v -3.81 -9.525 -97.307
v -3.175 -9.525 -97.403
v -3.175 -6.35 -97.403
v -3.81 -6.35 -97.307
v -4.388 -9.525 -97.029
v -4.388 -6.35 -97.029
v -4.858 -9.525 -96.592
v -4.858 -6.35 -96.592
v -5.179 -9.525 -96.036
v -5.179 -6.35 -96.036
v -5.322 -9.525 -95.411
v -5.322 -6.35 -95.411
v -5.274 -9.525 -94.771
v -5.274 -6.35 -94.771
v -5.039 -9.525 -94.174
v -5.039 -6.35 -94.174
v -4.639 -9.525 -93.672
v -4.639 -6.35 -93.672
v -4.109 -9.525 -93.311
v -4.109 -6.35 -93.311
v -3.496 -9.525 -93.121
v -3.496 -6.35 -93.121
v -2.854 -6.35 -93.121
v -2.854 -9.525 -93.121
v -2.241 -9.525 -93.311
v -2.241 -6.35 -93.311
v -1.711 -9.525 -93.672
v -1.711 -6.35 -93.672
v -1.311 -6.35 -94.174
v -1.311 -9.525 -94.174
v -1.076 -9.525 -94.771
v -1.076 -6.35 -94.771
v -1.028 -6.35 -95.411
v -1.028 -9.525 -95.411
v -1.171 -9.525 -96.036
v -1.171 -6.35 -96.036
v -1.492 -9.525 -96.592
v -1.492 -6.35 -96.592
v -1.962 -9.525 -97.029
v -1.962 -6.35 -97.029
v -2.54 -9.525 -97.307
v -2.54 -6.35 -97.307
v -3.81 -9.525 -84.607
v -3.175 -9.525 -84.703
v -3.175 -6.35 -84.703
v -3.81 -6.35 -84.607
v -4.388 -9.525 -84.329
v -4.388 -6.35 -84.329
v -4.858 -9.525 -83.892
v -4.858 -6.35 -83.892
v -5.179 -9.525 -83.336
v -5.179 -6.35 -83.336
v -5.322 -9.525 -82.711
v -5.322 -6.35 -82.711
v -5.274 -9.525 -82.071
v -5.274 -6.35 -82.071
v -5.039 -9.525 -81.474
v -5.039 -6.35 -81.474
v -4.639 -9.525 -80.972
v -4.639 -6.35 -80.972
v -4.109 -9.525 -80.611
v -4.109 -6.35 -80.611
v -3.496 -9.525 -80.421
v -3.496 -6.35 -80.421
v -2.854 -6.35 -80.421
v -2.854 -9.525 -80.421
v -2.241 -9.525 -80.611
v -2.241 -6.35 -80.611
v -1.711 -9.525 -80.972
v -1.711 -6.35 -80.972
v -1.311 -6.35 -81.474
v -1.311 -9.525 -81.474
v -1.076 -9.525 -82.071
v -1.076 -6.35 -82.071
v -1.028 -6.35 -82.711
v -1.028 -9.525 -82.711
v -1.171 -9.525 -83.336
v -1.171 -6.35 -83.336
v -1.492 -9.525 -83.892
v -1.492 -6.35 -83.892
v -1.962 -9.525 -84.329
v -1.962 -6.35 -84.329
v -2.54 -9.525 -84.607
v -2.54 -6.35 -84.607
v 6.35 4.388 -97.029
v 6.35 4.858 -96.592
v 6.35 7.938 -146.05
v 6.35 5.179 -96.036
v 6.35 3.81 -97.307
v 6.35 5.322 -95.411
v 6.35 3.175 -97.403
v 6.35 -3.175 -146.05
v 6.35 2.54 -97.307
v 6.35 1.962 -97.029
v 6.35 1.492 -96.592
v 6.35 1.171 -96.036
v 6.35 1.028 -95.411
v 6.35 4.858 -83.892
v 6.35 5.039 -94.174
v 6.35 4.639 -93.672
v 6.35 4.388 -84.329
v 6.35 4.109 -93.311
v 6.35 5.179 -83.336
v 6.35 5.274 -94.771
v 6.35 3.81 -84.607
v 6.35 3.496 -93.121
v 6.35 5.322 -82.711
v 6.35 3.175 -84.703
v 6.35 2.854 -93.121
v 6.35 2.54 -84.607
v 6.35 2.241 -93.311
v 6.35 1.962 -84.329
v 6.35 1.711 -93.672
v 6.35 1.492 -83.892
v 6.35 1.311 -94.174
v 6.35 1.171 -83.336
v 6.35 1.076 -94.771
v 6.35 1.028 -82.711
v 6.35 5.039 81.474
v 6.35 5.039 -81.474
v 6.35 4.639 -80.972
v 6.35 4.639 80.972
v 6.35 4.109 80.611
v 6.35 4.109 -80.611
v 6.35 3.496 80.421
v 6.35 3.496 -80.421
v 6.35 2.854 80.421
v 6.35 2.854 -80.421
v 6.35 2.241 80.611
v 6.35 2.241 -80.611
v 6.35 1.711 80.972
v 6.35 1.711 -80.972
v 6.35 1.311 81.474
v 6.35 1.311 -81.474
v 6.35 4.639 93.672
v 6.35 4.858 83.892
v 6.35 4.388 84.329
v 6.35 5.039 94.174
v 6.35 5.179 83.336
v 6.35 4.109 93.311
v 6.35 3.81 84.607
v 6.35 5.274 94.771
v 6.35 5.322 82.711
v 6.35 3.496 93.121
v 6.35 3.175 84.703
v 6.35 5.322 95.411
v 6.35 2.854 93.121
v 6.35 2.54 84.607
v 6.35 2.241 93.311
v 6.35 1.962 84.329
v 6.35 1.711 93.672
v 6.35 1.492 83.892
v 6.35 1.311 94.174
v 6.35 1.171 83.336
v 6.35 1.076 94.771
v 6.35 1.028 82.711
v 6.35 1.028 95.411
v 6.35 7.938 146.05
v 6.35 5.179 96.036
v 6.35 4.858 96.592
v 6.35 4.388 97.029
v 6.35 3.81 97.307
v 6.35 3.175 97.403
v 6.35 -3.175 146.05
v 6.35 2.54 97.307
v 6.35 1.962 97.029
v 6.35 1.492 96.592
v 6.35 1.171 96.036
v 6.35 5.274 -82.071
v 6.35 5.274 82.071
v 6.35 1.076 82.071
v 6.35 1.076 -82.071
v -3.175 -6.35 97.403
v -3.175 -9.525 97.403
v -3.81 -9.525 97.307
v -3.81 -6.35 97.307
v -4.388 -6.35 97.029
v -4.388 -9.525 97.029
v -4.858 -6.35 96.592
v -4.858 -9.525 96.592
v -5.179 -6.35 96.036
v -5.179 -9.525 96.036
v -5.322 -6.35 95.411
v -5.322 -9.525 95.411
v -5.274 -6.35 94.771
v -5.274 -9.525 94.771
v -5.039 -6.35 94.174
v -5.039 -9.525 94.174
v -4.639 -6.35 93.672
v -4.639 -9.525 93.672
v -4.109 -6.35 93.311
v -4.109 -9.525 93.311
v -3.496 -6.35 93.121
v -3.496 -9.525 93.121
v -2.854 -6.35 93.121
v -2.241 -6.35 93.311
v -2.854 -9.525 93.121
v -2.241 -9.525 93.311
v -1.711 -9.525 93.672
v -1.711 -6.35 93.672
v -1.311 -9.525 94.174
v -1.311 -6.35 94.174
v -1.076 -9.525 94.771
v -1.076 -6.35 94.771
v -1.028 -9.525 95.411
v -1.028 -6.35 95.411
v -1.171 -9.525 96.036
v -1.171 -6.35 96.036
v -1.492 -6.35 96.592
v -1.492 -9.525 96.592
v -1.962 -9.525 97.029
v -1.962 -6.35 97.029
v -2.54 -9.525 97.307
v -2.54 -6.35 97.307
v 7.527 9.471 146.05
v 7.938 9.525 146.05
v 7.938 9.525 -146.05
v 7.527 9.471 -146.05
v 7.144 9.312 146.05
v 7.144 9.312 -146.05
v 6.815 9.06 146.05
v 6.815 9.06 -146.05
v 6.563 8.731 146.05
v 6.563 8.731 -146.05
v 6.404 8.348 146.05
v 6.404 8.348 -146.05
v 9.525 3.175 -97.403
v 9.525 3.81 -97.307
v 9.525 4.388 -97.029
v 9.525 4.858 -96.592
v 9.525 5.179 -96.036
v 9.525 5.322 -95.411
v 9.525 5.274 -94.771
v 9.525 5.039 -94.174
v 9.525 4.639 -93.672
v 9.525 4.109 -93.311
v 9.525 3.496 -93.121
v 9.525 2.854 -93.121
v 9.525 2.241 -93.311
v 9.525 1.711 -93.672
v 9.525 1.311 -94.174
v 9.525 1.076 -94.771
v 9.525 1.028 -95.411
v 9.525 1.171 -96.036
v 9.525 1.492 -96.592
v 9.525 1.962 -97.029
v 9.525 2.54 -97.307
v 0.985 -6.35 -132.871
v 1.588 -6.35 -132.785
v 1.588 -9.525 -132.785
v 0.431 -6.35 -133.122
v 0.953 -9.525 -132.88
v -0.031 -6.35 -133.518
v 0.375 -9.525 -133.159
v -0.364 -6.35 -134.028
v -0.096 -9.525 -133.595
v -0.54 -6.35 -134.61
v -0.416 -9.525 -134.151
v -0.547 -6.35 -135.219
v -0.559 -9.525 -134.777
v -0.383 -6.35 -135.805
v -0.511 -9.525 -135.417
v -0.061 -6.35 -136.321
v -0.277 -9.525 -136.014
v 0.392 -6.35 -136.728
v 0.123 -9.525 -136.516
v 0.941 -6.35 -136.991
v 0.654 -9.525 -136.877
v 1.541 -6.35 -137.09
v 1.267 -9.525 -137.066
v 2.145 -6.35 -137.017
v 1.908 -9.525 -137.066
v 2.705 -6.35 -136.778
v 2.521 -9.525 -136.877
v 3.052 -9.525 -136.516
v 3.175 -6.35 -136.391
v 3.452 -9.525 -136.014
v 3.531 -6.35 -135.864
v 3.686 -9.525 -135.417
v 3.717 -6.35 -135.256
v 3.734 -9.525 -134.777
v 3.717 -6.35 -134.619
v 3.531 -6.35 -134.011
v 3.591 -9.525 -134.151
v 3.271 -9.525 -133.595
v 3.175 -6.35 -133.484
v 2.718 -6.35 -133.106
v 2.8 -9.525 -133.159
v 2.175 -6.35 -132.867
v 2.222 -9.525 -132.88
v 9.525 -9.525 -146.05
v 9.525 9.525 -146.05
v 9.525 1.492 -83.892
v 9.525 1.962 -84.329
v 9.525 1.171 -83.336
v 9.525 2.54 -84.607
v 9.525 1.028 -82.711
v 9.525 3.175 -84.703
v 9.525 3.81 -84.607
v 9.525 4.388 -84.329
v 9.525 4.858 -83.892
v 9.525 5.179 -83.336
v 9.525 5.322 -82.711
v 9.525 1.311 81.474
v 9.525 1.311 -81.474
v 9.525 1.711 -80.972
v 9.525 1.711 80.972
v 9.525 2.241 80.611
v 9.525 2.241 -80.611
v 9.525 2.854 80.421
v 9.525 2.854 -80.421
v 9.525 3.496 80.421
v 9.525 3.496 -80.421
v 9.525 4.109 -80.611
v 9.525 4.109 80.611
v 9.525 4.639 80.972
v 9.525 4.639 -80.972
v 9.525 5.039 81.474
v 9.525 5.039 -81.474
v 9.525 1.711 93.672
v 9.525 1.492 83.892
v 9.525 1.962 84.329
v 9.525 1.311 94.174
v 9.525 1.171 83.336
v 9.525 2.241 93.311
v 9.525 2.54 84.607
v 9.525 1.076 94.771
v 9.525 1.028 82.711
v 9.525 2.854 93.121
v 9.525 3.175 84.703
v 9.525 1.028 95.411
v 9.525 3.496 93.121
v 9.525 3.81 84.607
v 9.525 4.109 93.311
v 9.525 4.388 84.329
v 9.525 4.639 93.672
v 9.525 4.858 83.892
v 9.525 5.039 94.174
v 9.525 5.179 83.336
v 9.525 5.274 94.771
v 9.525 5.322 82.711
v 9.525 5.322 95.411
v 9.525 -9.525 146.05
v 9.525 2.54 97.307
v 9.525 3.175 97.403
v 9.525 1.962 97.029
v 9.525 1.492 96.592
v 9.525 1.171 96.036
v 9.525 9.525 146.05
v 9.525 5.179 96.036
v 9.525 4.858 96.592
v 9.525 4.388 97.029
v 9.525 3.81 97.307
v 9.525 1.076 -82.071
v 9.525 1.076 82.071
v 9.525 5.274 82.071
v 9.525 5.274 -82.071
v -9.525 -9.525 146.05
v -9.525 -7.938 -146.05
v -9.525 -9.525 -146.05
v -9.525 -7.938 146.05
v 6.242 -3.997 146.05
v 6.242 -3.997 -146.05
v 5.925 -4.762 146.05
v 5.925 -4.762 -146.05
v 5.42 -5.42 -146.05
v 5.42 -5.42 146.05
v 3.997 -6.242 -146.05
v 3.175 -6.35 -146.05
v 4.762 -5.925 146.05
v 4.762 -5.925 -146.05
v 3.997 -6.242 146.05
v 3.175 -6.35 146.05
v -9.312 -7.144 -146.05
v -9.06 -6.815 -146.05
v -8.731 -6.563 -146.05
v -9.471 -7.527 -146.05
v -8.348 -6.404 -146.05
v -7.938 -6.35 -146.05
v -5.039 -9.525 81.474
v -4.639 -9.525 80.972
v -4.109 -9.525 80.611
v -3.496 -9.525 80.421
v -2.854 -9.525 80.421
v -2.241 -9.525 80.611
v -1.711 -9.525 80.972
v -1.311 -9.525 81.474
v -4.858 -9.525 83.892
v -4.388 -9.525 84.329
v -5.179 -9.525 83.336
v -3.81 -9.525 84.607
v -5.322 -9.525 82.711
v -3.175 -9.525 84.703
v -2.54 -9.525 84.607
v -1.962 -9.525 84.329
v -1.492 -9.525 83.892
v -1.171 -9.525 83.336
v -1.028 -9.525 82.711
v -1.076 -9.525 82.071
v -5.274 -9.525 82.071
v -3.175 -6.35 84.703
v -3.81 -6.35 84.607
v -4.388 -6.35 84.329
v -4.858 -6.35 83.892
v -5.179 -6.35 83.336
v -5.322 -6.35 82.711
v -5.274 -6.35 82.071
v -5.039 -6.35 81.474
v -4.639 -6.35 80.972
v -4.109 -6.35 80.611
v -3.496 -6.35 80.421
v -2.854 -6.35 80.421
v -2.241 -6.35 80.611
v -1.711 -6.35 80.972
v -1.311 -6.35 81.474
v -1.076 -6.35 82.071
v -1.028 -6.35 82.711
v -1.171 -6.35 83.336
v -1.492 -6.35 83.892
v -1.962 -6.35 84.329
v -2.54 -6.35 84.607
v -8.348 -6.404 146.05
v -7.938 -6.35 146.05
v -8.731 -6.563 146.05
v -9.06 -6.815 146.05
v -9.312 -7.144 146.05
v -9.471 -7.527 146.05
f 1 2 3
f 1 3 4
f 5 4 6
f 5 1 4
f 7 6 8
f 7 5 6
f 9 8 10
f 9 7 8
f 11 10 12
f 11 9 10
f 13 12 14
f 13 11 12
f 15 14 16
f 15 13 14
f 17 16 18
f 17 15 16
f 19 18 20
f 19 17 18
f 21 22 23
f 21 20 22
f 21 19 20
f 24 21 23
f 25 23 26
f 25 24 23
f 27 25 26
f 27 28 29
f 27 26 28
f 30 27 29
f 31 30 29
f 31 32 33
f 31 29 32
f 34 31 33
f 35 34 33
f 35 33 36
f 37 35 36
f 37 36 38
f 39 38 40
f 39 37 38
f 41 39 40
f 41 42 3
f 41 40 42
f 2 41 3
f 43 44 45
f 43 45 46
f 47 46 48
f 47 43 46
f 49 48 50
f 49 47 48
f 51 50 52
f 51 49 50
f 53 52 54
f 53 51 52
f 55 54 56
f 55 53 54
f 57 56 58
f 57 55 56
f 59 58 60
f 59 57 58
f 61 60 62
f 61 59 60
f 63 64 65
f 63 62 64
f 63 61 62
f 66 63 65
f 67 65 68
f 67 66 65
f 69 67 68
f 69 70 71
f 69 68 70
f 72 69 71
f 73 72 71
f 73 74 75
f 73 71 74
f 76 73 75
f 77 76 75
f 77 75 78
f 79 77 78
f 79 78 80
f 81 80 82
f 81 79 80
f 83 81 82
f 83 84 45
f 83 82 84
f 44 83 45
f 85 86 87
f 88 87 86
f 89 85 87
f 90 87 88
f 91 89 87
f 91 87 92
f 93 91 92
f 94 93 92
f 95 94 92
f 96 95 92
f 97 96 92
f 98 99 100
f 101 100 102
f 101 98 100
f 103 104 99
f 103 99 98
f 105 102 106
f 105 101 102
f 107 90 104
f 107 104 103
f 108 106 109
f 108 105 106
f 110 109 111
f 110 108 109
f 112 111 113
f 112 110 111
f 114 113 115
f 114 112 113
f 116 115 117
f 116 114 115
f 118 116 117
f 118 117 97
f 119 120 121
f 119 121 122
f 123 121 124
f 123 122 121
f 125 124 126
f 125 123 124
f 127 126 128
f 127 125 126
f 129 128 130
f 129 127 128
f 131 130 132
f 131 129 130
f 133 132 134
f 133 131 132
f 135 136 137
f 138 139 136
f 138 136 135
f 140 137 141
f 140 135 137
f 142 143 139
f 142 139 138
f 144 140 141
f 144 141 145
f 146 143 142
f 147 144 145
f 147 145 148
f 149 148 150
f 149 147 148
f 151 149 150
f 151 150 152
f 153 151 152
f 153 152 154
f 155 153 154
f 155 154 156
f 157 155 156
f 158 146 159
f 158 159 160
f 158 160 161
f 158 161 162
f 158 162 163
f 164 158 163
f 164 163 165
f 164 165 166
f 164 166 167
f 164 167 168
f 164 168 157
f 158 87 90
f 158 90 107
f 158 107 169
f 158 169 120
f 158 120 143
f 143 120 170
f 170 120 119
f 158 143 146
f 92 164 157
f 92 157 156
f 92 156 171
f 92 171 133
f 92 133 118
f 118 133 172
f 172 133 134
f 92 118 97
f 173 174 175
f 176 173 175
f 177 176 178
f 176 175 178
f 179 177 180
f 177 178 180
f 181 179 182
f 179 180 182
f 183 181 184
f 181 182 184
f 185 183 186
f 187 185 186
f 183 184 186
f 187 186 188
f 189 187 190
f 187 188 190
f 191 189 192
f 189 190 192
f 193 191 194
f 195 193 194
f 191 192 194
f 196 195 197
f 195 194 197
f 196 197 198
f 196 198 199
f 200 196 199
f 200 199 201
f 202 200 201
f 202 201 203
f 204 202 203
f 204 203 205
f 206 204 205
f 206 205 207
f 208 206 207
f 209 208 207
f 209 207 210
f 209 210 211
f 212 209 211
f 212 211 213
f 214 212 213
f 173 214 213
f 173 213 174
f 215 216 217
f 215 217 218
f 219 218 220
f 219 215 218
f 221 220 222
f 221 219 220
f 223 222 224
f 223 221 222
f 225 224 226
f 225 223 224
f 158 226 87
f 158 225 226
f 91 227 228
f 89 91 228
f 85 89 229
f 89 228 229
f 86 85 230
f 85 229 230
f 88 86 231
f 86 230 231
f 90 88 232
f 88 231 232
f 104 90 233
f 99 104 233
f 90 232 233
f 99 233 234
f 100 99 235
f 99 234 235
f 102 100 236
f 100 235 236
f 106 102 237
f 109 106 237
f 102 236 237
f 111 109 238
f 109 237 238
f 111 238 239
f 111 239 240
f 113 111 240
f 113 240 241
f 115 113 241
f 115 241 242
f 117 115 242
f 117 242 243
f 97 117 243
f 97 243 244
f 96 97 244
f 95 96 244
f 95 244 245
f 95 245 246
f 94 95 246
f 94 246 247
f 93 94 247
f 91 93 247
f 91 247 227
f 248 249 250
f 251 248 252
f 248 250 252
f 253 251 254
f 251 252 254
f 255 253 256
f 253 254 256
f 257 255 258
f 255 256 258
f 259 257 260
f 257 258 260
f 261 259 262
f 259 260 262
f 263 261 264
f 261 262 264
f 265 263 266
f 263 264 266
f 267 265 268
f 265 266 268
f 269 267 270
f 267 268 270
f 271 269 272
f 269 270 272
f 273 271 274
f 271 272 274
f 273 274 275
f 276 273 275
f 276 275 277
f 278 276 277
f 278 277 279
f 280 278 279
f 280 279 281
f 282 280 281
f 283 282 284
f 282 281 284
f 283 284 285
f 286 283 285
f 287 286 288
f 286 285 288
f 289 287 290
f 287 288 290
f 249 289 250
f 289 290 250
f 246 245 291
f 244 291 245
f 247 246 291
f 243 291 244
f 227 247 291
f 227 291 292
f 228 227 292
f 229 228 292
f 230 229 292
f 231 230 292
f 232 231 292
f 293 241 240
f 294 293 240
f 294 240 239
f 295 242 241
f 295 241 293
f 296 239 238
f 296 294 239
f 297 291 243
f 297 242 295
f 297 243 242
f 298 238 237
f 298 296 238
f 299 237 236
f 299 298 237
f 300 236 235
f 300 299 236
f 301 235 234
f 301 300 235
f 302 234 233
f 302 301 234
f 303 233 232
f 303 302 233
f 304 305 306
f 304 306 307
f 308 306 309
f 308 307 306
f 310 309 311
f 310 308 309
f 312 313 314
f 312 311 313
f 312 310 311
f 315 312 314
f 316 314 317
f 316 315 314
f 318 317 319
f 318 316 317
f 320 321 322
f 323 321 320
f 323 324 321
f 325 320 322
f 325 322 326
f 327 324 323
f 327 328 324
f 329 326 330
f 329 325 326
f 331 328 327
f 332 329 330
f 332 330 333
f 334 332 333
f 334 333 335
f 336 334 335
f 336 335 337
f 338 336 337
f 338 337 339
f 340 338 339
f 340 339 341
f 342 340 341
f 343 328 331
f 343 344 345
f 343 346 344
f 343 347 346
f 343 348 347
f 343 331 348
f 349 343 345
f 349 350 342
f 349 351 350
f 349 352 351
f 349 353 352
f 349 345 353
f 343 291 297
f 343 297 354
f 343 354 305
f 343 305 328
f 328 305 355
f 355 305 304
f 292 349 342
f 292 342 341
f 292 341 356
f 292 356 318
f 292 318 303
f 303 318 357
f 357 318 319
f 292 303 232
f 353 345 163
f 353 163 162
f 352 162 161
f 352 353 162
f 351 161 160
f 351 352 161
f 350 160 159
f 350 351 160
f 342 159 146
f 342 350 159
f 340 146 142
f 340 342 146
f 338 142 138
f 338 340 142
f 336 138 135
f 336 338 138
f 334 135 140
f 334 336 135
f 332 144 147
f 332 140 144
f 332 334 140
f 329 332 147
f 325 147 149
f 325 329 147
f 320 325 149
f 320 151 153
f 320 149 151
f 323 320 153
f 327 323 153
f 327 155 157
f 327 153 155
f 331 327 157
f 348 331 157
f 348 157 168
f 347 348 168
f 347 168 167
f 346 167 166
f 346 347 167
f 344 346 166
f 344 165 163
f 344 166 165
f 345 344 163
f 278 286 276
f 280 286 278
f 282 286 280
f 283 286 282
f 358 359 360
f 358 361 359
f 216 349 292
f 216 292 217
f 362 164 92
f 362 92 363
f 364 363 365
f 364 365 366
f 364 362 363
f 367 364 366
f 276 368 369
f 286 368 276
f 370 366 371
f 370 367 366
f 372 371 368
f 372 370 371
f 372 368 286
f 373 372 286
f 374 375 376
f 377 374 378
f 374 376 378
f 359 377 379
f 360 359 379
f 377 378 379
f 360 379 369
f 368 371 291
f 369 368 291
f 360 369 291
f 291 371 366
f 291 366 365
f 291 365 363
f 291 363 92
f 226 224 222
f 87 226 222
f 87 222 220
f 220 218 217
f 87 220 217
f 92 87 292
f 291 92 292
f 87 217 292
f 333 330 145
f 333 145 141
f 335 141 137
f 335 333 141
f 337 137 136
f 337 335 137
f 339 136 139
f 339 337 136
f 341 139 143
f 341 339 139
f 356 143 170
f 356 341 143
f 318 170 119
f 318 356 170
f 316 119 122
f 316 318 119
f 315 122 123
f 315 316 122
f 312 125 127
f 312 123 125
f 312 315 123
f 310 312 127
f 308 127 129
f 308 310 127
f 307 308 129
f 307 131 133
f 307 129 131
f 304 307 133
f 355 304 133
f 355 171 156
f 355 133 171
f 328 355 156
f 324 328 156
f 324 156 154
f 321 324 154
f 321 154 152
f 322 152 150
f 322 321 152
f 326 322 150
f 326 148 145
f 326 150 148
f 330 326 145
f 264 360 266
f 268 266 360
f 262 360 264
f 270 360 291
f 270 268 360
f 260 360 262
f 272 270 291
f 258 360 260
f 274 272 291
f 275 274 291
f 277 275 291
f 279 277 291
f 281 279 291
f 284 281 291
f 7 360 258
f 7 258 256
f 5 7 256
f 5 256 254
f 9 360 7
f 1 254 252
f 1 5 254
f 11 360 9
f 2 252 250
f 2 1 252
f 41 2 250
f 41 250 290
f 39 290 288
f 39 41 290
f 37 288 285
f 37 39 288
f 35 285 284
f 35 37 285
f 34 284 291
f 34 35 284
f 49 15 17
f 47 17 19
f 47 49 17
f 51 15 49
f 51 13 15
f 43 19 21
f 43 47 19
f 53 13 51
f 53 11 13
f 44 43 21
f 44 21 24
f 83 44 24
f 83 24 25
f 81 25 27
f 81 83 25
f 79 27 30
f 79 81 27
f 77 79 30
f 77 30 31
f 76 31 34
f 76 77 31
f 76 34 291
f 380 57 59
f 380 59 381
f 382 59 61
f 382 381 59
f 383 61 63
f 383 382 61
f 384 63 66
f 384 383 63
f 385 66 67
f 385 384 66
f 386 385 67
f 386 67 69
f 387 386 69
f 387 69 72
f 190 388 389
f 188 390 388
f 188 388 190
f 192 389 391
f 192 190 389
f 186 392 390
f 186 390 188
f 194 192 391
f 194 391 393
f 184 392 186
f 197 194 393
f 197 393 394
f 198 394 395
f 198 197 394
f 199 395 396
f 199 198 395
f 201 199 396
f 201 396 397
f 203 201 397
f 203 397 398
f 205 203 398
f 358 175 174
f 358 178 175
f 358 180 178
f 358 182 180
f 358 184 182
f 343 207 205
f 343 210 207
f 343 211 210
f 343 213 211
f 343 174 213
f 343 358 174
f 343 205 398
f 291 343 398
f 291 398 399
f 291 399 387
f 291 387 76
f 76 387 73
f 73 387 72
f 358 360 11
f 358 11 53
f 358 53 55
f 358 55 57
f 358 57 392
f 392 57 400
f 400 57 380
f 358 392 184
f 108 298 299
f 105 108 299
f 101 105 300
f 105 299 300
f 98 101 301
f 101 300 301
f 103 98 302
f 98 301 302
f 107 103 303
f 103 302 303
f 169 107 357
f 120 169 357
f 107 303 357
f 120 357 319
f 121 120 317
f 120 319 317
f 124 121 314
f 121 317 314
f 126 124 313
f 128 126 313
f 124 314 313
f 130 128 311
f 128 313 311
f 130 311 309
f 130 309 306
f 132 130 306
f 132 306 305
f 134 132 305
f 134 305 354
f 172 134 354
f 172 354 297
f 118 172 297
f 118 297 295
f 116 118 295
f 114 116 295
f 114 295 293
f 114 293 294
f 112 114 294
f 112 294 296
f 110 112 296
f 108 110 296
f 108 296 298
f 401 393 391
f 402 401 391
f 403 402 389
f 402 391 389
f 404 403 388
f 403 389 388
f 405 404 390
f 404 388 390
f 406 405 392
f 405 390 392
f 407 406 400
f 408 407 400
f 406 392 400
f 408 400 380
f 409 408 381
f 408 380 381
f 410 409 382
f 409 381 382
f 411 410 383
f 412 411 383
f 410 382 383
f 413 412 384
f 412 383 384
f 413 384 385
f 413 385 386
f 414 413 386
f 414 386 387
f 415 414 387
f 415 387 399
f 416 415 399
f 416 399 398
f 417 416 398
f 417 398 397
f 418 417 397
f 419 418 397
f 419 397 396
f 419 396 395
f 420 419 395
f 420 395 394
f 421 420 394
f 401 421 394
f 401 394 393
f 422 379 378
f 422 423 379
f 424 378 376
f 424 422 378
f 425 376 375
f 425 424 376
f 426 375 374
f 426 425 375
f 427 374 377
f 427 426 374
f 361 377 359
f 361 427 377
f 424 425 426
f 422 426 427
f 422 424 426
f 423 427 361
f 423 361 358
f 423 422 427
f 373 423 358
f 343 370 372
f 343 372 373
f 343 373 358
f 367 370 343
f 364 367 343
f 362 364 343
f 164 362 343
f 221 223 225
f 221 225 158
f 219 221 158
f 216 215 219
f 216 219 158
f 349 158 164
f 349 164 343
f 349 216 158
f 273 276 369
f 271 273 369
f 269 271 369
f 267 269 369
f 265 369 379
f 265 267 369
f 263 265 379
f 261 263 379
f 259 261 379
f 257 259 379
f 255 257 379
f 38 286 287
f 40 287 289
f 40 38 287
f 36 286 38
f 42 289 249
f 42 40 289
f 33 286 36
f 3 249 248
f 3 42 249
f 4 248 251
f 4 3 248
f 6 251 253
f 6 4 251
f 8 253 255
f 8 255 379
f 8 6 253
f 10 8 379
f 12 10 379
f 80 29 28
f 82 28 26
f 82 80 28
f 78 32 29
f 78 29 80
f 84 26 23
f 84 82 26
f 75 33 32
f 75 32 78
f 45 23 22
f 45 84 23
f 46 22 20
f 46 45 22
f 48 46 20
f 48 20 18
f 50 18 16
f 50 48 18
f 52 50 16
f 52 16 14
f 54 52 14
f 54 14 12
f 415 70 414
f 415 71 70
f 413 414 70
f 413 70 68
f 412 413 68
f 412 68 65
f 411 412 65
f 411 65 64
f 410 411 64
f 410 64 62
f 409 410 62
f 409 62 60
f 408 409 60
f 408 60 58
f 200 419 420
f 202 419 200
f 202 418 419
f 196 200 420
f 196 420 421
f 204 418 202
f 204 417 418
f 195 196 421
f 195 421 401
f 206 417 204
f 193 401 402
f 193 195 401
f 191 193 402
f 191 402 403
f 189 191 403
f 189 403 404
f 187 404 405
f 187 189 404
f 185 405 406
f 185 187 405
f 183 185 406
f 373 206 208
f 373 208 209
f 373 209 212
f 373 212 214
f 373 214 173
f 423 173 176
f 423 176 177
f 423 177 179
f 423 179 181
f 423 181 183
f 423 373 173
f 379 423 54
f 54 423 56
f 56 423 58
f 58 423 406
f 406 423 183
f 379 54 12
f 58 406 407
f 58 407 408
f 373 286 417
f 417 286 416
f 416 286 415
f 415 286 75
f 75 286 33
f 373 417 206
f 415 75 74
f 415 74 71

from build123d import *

# Parameters (mm, degrees)
BOSS_EXTRUDE1_DEPTH          = 146.05
F_18_0_1695_DIAMETER_HOLE1_D = 4.3053
MIRROR2_COPY_1_D             = 4.3053
SKETCH19_W                   = 2.15265
SKETCH19_H                   = 3.175


with BuildPart() as part:
    # Sketch2 → Boss-Extrude1 (new, symmetric)
    with BuildSketch(Plane.XY):
        with BuildLine():
            Line((-9.525, -9.525), (9.525, -9.525))
            Line((9.525, -9.525), (9.525, 9.525))
            Line((9.525, 9.525), (7.9375, 9.525))
            ThreePointArc((7.9375, 9.525), (6.814967985, 9.060032015), (6.35, 7.9375))
            Line((6.35, 7.9375), (6.35, -3.175))
            ThreePointArc((6.35, -3.175), (5.42006403, -5.42006403), (3.175, -6.35))
            Line((3.175, -6.35), (-7.9375, -6.35))
            ThreePointArc((-7.9375, -6.35), (-9.060032015, -6.814967985), (-9.525, -7.9375))
            Line((-9.525, -7.9375), (-9.525, -9.525))
        make_face()
    extrude(amount=BOSS_EXTRUDE1_DEPTH, both=True)

    # #18 (0.1695) Diameter Hole1 (through all)
    with Locations(Plane.ZY.offset(-6.35)):
        with Locations((-95.25, 3.175), (-82.55, 3.175)):
            f_18_0_1695_diameter_hole1 = Hole(F_18_0_1695_DIAMETER_HOLE1_D / 2)

    # Mirror1: #18 (0.1695) Diameter Hole1 across plane
    add(f_18_0_1695_diameter_hole1.mirror(Plane(origin=(0, 0, 0), x_dir=(0, 0, 1), z_dir=(0.7071067811865477, 0.7071067811865475, 0))), mode=Mode.SUBTRACT)

    # Mirror2: #18 (0.1695) Diameter Hole1 across plane
    add(f_18_0_1695_diameter_hole1.mirror(Plane.XY), mode=Mode.SUBTRACT)

    # Mirror2 copy 1 (through all)
    with Locations(Plane(origin=(0, -6.35, 0), x_dir=(0, 0, -1), z_dir=(0, 1, 0))):
        with Locations((-95.25, 3.175), (-82.55, 3.175)):
            Hole(MIRROR2_COPY_1_D / 2)

    # Sketch19 → #8 Clearance Hole1 (revolve, cut)
    with BuildSketch(Plane(origin=(1.5875, -6.35, -134.9375), x_dir=(0, 0, 1), z_dir=(1, 0, 0))):
        with Locations((1.076325, 1.5875)):
            Rectangle(SKETCH19_W, SKETCH19_H)
    revolve(axis=Axis((1.5875, 0, -134.9375), (0, -1, 0)), mode=Mode.SUBTRACT)


solid = part.part
